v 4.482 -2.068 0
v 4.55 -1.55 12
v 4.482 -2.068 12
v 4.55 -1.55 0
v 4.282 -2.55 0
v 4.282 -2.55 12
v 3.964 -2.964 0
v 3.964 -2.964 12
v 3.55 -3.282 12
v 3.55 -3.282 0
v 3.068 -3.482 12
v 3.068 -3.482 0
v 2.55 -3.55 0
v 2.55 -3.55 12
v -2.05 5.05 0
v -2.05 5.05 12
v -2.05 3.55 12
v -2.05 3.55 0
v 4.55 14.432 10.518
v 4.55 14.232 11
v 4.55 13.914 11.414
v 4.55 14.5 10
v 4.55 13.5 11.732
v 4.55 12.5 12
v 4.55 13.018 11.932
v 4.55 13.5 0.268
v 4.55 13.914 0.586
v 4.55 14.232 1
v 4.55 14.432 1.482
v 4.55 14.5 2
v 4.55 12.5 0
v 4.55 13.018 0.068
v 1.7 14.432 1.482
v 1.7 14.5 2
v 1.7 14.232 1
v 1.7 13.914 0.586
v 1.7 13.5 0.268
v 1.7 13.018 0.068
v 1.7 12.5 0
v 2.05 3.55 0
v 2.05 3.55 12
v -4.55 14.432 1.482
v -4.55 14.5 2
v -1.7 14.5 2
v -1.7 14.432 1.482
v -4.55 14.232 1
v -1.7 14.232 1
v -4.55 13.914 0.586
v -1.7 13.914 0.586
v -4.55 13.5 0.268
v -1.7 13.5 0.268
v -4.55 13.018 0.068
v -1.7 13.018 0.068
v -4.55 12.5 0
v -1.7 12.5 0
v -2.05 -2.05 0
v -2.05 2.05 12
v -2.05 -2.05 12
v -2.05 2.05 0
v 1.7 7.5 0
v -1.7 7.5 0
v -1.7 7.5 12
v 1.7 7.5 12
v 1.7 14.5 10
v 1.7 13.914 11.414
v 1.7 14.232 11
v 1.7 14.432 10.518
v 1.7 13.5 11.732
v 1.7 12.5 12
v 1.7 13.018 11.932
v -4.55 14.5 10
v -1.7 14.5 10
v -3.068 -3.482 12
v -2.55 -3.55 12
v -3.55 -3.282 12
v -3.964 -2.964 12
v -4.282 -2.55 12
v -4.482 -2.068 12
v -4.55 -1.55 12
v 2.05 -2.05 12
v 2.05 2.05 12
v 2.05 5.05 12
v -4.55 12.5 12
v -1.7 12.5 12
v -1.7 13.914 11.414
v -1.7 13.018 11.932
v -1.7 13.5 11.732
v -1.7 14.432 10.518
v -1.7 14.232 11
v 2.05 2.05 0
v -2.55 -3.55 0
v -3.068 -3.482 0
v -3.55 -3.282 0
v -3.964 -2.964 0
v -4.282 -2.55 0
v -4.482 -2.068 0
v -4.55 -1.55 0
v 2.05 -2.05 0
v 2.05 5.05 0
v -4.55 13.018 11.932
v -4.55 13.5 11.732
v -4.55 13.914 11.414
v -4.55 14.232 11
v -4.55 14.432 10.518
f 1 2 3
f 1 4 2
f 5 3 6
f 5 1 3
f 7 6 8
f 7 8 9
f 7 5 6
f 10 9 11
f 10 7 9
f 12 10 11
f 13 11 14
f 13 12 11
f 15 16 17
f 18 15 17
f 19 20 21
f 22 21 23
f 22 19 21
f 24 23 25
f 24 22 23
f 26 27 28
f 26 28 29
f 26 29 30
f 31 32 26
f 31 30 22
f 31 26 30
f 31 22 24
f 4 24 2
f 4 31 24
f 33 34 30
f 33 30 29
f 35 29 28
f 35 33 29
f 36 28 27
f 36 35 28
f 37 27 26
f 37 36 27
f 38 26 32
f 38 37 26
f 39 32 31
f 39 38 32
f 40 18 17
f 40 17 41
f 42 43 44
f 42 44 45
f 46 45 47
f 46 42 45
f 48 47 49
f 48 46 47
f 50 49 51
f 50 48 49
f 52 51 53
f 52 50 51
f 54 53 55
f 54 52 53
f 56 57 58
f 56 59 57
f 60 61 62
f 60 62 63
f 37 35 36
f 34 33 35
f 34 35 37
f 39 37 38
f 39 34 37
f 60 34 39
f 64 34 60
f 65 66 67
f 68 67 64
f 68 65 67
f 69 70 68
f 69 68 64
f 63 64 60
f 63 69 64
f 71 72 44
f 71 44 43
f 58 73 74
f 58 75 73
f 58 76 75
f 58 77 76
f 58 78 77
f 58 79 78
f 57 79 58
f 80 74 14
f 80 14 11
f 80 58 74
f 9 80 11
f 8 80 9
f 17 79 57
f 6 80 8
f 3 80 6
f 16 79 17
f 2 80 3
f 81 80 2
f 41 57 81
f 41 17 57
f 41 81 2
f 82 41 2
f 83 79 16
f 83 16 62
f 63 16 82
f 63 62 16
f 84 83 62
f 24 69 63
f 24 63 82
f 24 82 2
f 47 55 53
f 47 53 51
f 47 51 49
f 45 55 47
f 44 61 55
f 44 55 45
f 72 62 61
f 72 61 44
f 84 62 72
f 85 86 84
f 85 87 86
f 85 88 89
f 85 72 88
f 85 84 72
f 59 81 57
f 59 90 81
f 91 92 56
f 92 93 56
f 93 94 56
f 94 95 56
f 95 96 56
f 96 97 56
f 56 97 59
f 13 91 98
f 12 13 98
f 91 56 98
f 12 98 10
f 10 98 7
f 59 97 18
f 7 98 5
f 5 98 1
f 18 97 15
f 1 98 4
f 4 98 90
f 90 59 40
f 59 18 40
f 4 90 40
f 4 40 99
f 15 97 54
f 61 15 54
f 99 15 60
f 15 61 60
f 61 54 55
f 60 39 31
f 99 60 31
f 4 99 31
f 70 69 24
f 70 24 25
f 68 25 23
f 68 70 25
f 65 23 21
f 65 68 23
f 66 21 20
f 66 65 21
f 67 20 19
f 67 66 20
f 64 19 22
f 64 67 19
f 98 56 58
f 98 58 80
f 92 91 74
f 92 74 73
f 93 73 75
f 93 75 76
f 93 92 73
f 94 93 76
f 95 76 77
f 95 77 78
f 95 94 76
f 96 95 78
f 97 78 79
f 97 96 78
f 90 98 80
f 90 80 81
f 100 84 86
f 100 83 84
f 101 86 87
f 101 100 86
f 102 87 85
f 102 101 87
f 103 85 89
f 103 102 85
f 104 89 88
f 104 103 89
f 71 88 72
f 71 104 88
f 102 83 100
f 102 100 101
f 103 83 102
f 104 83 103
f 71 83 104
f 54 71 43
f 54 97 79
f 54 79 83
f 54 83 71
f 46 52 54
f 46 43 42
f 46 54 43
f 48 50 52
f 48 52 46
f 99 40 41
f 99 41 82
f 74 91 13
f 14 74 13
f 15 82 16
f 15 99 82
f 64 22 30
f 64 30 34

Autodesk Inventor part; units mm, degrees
sketch "Sketch1" plane through (0, 0, 0) normal (0, 0, 1) x (1, 0, 0)
  line L0 (-4.55, 7.5) -> (4.55, 7.5)
  line L1 (4.55, 7.5) -> (4.55, -7.5)
  line L2 (4.55, -7.5) -> (-4.55, -7.5)
  line L3 (-4.55, -7.5) -> (-4.55, 7.5)
  line L4 (-4.55, 7.5) -> (4.55, -7.5) construction
  line L5 (4.55, 7.5) -> (-4.55, -7.5) construction
  line L6 (-2.05, -2.05) -> (2.05, -2.05)
  line L7 (2.05, -2.05) -> (2.05, 2.05)
  line L8 (2.05, 2.05) -> (-2.05, 2.05)
  line L9 (-2.05, 2.05) -> (-2.05, -2.05)
  line L10 (-2.05, -2.05) -> (2.05, 2.05) construction
  line L11 (2.05, -2.05) -> (-2.05, 2.05) construction
  line L12 (-4.55, 6) -> (-4.55, 7.5)
  line L13 (-4.55, -6) -> (-4.55, -7.5)
  line L14 (4.55, 6) -> (4.55, 7.5)
  line L15 (4.55, -6) -> (4.55, -7.5)
  point P0 (0, 0)
  point P1 (16.55, 6)
  dimension "d1" = 9.1
  dimension "d2" = 4.1
  dimension "d3" = 4.1
extrude "Extrusion1" add sketch "Sketch1" along normal blind 12
sketch "Sketch2" plane through (0, 0, 12) normal (0, 0, 1) x (1, 0, 0)
  line L0 (4.55, 7.5) -> (-4.55, 7.5) projected
  line L1 (-4.55, 7.5) -> (-1.7, 7.5)
  line L2 (-1.7, 7.5) -> (-1.7, 14.5)
  line L3 (-1.7, 14.5) -> (-4.55, 14.5)
  line L4 (-4.55, 14.5) -> (-4.55, 7.5)
  line L5 (1.7, 7.5) -> (4.55, 7.5)
  line L6 (4.55, 7.5) -> (4.55, 14.5)
  line L7 (4.55, 14.5) -> (1.7, 14.5)
  line L8 (1.7, 14.5) -> (1.7, 7.5)
  point P0 (0, 0)
  point P1 (16.55, 7.5)
  point P2 (-16.55, 7.5)
  dimension "d15" = 2.85
  dimension "d16" = 2.85
  dimension "d17" = 7
  dimension "d18" = 7
  dimension "d19" = 1.7
  dimension "d20" = 1.7
extrude "Extrusion2" add sketch "Sketch2" against normal up to surface (12 mm away)
sketch "Sketch5" plane through (0, 0, 0) normal (0, 0, -1) x (-1, 0, 0)
  line L0 (-2.05, 5.05) -> (2.05, 5.05)
  line L1 (2.05, 5.05) -> (2.05, 3.55)
  line L2 (2.05, 3.55) -> (-2.05, 3.55)
  line L3 (-2.05, 3.55) -> (-2.05, 5.05)
  line L4 (-2.05, -3.55) -> (2.05, -3.55)
  line L5 (2.05, -3.55) -> (2.05, -5.05)
  line L6 (2.05, -5.05) -> (-2.05, -5.05)
  line L7 (-2.05, -5.05) -> (-2.05, -3.55)
  line L8 (2.05, 2.05) -> (-2.05, 2.05) projected
  line L9 (2.05, -2.05) -> (2.05, 2.05) projected
  line L10 (-2.05, -2.05) -> (2.05, -2.05) projected
  point P0 (0, 0)
  dimension "d31" = 4.1
  dimension "d32" = 4.1
  dimension "d33" = 1.5
  dimension "d34" = 1.5
  dimension "d35" = 1.5
  dimension "d36" = 1.5
extrude "Extrusion4" cut sketch "Sketch5" against normal through all
sketch "Sketch6" plane through (0, 0, 12) normal (0, 0, 1) x (1, 0, 0)
  line L0 (-4.55, 14.5) -> (-4.55, -7.5) projected
  line L1 (-4.55, -7.5) -> (4.55, -7.5) projected
  line L2 (-4.55, -3.55) -> (4.55, -3.55)
  line L3 (4.55, -3.55) -> (4.55, -7.5)
  line L4 (4.55, -7.5) -> (-4.55, -7.5)
  line L5 (-4.55, -7.5) -> (-4.55, -3.55)
  line L6 (-2.05, -3.55) -> (2.05, -3.55) projected
  point P0 (0, 0)
  dimension "d42" = 0
extrude "Extrusion5" cut sketch "Sketch6" against normal through all
fillet "Fillet3" radius 2 6 edges at (4.55, -3.55, 6) (-4.55, -3.55, 6) (3.125, 14.5, 12) (-3.125, 14.5, 12) (-3.125, 14.5, 0) (3.125, 14.5, 0)
equation "\"d31\" = d32"
properties part number "fuselage_honeycomb_interface_v2"
